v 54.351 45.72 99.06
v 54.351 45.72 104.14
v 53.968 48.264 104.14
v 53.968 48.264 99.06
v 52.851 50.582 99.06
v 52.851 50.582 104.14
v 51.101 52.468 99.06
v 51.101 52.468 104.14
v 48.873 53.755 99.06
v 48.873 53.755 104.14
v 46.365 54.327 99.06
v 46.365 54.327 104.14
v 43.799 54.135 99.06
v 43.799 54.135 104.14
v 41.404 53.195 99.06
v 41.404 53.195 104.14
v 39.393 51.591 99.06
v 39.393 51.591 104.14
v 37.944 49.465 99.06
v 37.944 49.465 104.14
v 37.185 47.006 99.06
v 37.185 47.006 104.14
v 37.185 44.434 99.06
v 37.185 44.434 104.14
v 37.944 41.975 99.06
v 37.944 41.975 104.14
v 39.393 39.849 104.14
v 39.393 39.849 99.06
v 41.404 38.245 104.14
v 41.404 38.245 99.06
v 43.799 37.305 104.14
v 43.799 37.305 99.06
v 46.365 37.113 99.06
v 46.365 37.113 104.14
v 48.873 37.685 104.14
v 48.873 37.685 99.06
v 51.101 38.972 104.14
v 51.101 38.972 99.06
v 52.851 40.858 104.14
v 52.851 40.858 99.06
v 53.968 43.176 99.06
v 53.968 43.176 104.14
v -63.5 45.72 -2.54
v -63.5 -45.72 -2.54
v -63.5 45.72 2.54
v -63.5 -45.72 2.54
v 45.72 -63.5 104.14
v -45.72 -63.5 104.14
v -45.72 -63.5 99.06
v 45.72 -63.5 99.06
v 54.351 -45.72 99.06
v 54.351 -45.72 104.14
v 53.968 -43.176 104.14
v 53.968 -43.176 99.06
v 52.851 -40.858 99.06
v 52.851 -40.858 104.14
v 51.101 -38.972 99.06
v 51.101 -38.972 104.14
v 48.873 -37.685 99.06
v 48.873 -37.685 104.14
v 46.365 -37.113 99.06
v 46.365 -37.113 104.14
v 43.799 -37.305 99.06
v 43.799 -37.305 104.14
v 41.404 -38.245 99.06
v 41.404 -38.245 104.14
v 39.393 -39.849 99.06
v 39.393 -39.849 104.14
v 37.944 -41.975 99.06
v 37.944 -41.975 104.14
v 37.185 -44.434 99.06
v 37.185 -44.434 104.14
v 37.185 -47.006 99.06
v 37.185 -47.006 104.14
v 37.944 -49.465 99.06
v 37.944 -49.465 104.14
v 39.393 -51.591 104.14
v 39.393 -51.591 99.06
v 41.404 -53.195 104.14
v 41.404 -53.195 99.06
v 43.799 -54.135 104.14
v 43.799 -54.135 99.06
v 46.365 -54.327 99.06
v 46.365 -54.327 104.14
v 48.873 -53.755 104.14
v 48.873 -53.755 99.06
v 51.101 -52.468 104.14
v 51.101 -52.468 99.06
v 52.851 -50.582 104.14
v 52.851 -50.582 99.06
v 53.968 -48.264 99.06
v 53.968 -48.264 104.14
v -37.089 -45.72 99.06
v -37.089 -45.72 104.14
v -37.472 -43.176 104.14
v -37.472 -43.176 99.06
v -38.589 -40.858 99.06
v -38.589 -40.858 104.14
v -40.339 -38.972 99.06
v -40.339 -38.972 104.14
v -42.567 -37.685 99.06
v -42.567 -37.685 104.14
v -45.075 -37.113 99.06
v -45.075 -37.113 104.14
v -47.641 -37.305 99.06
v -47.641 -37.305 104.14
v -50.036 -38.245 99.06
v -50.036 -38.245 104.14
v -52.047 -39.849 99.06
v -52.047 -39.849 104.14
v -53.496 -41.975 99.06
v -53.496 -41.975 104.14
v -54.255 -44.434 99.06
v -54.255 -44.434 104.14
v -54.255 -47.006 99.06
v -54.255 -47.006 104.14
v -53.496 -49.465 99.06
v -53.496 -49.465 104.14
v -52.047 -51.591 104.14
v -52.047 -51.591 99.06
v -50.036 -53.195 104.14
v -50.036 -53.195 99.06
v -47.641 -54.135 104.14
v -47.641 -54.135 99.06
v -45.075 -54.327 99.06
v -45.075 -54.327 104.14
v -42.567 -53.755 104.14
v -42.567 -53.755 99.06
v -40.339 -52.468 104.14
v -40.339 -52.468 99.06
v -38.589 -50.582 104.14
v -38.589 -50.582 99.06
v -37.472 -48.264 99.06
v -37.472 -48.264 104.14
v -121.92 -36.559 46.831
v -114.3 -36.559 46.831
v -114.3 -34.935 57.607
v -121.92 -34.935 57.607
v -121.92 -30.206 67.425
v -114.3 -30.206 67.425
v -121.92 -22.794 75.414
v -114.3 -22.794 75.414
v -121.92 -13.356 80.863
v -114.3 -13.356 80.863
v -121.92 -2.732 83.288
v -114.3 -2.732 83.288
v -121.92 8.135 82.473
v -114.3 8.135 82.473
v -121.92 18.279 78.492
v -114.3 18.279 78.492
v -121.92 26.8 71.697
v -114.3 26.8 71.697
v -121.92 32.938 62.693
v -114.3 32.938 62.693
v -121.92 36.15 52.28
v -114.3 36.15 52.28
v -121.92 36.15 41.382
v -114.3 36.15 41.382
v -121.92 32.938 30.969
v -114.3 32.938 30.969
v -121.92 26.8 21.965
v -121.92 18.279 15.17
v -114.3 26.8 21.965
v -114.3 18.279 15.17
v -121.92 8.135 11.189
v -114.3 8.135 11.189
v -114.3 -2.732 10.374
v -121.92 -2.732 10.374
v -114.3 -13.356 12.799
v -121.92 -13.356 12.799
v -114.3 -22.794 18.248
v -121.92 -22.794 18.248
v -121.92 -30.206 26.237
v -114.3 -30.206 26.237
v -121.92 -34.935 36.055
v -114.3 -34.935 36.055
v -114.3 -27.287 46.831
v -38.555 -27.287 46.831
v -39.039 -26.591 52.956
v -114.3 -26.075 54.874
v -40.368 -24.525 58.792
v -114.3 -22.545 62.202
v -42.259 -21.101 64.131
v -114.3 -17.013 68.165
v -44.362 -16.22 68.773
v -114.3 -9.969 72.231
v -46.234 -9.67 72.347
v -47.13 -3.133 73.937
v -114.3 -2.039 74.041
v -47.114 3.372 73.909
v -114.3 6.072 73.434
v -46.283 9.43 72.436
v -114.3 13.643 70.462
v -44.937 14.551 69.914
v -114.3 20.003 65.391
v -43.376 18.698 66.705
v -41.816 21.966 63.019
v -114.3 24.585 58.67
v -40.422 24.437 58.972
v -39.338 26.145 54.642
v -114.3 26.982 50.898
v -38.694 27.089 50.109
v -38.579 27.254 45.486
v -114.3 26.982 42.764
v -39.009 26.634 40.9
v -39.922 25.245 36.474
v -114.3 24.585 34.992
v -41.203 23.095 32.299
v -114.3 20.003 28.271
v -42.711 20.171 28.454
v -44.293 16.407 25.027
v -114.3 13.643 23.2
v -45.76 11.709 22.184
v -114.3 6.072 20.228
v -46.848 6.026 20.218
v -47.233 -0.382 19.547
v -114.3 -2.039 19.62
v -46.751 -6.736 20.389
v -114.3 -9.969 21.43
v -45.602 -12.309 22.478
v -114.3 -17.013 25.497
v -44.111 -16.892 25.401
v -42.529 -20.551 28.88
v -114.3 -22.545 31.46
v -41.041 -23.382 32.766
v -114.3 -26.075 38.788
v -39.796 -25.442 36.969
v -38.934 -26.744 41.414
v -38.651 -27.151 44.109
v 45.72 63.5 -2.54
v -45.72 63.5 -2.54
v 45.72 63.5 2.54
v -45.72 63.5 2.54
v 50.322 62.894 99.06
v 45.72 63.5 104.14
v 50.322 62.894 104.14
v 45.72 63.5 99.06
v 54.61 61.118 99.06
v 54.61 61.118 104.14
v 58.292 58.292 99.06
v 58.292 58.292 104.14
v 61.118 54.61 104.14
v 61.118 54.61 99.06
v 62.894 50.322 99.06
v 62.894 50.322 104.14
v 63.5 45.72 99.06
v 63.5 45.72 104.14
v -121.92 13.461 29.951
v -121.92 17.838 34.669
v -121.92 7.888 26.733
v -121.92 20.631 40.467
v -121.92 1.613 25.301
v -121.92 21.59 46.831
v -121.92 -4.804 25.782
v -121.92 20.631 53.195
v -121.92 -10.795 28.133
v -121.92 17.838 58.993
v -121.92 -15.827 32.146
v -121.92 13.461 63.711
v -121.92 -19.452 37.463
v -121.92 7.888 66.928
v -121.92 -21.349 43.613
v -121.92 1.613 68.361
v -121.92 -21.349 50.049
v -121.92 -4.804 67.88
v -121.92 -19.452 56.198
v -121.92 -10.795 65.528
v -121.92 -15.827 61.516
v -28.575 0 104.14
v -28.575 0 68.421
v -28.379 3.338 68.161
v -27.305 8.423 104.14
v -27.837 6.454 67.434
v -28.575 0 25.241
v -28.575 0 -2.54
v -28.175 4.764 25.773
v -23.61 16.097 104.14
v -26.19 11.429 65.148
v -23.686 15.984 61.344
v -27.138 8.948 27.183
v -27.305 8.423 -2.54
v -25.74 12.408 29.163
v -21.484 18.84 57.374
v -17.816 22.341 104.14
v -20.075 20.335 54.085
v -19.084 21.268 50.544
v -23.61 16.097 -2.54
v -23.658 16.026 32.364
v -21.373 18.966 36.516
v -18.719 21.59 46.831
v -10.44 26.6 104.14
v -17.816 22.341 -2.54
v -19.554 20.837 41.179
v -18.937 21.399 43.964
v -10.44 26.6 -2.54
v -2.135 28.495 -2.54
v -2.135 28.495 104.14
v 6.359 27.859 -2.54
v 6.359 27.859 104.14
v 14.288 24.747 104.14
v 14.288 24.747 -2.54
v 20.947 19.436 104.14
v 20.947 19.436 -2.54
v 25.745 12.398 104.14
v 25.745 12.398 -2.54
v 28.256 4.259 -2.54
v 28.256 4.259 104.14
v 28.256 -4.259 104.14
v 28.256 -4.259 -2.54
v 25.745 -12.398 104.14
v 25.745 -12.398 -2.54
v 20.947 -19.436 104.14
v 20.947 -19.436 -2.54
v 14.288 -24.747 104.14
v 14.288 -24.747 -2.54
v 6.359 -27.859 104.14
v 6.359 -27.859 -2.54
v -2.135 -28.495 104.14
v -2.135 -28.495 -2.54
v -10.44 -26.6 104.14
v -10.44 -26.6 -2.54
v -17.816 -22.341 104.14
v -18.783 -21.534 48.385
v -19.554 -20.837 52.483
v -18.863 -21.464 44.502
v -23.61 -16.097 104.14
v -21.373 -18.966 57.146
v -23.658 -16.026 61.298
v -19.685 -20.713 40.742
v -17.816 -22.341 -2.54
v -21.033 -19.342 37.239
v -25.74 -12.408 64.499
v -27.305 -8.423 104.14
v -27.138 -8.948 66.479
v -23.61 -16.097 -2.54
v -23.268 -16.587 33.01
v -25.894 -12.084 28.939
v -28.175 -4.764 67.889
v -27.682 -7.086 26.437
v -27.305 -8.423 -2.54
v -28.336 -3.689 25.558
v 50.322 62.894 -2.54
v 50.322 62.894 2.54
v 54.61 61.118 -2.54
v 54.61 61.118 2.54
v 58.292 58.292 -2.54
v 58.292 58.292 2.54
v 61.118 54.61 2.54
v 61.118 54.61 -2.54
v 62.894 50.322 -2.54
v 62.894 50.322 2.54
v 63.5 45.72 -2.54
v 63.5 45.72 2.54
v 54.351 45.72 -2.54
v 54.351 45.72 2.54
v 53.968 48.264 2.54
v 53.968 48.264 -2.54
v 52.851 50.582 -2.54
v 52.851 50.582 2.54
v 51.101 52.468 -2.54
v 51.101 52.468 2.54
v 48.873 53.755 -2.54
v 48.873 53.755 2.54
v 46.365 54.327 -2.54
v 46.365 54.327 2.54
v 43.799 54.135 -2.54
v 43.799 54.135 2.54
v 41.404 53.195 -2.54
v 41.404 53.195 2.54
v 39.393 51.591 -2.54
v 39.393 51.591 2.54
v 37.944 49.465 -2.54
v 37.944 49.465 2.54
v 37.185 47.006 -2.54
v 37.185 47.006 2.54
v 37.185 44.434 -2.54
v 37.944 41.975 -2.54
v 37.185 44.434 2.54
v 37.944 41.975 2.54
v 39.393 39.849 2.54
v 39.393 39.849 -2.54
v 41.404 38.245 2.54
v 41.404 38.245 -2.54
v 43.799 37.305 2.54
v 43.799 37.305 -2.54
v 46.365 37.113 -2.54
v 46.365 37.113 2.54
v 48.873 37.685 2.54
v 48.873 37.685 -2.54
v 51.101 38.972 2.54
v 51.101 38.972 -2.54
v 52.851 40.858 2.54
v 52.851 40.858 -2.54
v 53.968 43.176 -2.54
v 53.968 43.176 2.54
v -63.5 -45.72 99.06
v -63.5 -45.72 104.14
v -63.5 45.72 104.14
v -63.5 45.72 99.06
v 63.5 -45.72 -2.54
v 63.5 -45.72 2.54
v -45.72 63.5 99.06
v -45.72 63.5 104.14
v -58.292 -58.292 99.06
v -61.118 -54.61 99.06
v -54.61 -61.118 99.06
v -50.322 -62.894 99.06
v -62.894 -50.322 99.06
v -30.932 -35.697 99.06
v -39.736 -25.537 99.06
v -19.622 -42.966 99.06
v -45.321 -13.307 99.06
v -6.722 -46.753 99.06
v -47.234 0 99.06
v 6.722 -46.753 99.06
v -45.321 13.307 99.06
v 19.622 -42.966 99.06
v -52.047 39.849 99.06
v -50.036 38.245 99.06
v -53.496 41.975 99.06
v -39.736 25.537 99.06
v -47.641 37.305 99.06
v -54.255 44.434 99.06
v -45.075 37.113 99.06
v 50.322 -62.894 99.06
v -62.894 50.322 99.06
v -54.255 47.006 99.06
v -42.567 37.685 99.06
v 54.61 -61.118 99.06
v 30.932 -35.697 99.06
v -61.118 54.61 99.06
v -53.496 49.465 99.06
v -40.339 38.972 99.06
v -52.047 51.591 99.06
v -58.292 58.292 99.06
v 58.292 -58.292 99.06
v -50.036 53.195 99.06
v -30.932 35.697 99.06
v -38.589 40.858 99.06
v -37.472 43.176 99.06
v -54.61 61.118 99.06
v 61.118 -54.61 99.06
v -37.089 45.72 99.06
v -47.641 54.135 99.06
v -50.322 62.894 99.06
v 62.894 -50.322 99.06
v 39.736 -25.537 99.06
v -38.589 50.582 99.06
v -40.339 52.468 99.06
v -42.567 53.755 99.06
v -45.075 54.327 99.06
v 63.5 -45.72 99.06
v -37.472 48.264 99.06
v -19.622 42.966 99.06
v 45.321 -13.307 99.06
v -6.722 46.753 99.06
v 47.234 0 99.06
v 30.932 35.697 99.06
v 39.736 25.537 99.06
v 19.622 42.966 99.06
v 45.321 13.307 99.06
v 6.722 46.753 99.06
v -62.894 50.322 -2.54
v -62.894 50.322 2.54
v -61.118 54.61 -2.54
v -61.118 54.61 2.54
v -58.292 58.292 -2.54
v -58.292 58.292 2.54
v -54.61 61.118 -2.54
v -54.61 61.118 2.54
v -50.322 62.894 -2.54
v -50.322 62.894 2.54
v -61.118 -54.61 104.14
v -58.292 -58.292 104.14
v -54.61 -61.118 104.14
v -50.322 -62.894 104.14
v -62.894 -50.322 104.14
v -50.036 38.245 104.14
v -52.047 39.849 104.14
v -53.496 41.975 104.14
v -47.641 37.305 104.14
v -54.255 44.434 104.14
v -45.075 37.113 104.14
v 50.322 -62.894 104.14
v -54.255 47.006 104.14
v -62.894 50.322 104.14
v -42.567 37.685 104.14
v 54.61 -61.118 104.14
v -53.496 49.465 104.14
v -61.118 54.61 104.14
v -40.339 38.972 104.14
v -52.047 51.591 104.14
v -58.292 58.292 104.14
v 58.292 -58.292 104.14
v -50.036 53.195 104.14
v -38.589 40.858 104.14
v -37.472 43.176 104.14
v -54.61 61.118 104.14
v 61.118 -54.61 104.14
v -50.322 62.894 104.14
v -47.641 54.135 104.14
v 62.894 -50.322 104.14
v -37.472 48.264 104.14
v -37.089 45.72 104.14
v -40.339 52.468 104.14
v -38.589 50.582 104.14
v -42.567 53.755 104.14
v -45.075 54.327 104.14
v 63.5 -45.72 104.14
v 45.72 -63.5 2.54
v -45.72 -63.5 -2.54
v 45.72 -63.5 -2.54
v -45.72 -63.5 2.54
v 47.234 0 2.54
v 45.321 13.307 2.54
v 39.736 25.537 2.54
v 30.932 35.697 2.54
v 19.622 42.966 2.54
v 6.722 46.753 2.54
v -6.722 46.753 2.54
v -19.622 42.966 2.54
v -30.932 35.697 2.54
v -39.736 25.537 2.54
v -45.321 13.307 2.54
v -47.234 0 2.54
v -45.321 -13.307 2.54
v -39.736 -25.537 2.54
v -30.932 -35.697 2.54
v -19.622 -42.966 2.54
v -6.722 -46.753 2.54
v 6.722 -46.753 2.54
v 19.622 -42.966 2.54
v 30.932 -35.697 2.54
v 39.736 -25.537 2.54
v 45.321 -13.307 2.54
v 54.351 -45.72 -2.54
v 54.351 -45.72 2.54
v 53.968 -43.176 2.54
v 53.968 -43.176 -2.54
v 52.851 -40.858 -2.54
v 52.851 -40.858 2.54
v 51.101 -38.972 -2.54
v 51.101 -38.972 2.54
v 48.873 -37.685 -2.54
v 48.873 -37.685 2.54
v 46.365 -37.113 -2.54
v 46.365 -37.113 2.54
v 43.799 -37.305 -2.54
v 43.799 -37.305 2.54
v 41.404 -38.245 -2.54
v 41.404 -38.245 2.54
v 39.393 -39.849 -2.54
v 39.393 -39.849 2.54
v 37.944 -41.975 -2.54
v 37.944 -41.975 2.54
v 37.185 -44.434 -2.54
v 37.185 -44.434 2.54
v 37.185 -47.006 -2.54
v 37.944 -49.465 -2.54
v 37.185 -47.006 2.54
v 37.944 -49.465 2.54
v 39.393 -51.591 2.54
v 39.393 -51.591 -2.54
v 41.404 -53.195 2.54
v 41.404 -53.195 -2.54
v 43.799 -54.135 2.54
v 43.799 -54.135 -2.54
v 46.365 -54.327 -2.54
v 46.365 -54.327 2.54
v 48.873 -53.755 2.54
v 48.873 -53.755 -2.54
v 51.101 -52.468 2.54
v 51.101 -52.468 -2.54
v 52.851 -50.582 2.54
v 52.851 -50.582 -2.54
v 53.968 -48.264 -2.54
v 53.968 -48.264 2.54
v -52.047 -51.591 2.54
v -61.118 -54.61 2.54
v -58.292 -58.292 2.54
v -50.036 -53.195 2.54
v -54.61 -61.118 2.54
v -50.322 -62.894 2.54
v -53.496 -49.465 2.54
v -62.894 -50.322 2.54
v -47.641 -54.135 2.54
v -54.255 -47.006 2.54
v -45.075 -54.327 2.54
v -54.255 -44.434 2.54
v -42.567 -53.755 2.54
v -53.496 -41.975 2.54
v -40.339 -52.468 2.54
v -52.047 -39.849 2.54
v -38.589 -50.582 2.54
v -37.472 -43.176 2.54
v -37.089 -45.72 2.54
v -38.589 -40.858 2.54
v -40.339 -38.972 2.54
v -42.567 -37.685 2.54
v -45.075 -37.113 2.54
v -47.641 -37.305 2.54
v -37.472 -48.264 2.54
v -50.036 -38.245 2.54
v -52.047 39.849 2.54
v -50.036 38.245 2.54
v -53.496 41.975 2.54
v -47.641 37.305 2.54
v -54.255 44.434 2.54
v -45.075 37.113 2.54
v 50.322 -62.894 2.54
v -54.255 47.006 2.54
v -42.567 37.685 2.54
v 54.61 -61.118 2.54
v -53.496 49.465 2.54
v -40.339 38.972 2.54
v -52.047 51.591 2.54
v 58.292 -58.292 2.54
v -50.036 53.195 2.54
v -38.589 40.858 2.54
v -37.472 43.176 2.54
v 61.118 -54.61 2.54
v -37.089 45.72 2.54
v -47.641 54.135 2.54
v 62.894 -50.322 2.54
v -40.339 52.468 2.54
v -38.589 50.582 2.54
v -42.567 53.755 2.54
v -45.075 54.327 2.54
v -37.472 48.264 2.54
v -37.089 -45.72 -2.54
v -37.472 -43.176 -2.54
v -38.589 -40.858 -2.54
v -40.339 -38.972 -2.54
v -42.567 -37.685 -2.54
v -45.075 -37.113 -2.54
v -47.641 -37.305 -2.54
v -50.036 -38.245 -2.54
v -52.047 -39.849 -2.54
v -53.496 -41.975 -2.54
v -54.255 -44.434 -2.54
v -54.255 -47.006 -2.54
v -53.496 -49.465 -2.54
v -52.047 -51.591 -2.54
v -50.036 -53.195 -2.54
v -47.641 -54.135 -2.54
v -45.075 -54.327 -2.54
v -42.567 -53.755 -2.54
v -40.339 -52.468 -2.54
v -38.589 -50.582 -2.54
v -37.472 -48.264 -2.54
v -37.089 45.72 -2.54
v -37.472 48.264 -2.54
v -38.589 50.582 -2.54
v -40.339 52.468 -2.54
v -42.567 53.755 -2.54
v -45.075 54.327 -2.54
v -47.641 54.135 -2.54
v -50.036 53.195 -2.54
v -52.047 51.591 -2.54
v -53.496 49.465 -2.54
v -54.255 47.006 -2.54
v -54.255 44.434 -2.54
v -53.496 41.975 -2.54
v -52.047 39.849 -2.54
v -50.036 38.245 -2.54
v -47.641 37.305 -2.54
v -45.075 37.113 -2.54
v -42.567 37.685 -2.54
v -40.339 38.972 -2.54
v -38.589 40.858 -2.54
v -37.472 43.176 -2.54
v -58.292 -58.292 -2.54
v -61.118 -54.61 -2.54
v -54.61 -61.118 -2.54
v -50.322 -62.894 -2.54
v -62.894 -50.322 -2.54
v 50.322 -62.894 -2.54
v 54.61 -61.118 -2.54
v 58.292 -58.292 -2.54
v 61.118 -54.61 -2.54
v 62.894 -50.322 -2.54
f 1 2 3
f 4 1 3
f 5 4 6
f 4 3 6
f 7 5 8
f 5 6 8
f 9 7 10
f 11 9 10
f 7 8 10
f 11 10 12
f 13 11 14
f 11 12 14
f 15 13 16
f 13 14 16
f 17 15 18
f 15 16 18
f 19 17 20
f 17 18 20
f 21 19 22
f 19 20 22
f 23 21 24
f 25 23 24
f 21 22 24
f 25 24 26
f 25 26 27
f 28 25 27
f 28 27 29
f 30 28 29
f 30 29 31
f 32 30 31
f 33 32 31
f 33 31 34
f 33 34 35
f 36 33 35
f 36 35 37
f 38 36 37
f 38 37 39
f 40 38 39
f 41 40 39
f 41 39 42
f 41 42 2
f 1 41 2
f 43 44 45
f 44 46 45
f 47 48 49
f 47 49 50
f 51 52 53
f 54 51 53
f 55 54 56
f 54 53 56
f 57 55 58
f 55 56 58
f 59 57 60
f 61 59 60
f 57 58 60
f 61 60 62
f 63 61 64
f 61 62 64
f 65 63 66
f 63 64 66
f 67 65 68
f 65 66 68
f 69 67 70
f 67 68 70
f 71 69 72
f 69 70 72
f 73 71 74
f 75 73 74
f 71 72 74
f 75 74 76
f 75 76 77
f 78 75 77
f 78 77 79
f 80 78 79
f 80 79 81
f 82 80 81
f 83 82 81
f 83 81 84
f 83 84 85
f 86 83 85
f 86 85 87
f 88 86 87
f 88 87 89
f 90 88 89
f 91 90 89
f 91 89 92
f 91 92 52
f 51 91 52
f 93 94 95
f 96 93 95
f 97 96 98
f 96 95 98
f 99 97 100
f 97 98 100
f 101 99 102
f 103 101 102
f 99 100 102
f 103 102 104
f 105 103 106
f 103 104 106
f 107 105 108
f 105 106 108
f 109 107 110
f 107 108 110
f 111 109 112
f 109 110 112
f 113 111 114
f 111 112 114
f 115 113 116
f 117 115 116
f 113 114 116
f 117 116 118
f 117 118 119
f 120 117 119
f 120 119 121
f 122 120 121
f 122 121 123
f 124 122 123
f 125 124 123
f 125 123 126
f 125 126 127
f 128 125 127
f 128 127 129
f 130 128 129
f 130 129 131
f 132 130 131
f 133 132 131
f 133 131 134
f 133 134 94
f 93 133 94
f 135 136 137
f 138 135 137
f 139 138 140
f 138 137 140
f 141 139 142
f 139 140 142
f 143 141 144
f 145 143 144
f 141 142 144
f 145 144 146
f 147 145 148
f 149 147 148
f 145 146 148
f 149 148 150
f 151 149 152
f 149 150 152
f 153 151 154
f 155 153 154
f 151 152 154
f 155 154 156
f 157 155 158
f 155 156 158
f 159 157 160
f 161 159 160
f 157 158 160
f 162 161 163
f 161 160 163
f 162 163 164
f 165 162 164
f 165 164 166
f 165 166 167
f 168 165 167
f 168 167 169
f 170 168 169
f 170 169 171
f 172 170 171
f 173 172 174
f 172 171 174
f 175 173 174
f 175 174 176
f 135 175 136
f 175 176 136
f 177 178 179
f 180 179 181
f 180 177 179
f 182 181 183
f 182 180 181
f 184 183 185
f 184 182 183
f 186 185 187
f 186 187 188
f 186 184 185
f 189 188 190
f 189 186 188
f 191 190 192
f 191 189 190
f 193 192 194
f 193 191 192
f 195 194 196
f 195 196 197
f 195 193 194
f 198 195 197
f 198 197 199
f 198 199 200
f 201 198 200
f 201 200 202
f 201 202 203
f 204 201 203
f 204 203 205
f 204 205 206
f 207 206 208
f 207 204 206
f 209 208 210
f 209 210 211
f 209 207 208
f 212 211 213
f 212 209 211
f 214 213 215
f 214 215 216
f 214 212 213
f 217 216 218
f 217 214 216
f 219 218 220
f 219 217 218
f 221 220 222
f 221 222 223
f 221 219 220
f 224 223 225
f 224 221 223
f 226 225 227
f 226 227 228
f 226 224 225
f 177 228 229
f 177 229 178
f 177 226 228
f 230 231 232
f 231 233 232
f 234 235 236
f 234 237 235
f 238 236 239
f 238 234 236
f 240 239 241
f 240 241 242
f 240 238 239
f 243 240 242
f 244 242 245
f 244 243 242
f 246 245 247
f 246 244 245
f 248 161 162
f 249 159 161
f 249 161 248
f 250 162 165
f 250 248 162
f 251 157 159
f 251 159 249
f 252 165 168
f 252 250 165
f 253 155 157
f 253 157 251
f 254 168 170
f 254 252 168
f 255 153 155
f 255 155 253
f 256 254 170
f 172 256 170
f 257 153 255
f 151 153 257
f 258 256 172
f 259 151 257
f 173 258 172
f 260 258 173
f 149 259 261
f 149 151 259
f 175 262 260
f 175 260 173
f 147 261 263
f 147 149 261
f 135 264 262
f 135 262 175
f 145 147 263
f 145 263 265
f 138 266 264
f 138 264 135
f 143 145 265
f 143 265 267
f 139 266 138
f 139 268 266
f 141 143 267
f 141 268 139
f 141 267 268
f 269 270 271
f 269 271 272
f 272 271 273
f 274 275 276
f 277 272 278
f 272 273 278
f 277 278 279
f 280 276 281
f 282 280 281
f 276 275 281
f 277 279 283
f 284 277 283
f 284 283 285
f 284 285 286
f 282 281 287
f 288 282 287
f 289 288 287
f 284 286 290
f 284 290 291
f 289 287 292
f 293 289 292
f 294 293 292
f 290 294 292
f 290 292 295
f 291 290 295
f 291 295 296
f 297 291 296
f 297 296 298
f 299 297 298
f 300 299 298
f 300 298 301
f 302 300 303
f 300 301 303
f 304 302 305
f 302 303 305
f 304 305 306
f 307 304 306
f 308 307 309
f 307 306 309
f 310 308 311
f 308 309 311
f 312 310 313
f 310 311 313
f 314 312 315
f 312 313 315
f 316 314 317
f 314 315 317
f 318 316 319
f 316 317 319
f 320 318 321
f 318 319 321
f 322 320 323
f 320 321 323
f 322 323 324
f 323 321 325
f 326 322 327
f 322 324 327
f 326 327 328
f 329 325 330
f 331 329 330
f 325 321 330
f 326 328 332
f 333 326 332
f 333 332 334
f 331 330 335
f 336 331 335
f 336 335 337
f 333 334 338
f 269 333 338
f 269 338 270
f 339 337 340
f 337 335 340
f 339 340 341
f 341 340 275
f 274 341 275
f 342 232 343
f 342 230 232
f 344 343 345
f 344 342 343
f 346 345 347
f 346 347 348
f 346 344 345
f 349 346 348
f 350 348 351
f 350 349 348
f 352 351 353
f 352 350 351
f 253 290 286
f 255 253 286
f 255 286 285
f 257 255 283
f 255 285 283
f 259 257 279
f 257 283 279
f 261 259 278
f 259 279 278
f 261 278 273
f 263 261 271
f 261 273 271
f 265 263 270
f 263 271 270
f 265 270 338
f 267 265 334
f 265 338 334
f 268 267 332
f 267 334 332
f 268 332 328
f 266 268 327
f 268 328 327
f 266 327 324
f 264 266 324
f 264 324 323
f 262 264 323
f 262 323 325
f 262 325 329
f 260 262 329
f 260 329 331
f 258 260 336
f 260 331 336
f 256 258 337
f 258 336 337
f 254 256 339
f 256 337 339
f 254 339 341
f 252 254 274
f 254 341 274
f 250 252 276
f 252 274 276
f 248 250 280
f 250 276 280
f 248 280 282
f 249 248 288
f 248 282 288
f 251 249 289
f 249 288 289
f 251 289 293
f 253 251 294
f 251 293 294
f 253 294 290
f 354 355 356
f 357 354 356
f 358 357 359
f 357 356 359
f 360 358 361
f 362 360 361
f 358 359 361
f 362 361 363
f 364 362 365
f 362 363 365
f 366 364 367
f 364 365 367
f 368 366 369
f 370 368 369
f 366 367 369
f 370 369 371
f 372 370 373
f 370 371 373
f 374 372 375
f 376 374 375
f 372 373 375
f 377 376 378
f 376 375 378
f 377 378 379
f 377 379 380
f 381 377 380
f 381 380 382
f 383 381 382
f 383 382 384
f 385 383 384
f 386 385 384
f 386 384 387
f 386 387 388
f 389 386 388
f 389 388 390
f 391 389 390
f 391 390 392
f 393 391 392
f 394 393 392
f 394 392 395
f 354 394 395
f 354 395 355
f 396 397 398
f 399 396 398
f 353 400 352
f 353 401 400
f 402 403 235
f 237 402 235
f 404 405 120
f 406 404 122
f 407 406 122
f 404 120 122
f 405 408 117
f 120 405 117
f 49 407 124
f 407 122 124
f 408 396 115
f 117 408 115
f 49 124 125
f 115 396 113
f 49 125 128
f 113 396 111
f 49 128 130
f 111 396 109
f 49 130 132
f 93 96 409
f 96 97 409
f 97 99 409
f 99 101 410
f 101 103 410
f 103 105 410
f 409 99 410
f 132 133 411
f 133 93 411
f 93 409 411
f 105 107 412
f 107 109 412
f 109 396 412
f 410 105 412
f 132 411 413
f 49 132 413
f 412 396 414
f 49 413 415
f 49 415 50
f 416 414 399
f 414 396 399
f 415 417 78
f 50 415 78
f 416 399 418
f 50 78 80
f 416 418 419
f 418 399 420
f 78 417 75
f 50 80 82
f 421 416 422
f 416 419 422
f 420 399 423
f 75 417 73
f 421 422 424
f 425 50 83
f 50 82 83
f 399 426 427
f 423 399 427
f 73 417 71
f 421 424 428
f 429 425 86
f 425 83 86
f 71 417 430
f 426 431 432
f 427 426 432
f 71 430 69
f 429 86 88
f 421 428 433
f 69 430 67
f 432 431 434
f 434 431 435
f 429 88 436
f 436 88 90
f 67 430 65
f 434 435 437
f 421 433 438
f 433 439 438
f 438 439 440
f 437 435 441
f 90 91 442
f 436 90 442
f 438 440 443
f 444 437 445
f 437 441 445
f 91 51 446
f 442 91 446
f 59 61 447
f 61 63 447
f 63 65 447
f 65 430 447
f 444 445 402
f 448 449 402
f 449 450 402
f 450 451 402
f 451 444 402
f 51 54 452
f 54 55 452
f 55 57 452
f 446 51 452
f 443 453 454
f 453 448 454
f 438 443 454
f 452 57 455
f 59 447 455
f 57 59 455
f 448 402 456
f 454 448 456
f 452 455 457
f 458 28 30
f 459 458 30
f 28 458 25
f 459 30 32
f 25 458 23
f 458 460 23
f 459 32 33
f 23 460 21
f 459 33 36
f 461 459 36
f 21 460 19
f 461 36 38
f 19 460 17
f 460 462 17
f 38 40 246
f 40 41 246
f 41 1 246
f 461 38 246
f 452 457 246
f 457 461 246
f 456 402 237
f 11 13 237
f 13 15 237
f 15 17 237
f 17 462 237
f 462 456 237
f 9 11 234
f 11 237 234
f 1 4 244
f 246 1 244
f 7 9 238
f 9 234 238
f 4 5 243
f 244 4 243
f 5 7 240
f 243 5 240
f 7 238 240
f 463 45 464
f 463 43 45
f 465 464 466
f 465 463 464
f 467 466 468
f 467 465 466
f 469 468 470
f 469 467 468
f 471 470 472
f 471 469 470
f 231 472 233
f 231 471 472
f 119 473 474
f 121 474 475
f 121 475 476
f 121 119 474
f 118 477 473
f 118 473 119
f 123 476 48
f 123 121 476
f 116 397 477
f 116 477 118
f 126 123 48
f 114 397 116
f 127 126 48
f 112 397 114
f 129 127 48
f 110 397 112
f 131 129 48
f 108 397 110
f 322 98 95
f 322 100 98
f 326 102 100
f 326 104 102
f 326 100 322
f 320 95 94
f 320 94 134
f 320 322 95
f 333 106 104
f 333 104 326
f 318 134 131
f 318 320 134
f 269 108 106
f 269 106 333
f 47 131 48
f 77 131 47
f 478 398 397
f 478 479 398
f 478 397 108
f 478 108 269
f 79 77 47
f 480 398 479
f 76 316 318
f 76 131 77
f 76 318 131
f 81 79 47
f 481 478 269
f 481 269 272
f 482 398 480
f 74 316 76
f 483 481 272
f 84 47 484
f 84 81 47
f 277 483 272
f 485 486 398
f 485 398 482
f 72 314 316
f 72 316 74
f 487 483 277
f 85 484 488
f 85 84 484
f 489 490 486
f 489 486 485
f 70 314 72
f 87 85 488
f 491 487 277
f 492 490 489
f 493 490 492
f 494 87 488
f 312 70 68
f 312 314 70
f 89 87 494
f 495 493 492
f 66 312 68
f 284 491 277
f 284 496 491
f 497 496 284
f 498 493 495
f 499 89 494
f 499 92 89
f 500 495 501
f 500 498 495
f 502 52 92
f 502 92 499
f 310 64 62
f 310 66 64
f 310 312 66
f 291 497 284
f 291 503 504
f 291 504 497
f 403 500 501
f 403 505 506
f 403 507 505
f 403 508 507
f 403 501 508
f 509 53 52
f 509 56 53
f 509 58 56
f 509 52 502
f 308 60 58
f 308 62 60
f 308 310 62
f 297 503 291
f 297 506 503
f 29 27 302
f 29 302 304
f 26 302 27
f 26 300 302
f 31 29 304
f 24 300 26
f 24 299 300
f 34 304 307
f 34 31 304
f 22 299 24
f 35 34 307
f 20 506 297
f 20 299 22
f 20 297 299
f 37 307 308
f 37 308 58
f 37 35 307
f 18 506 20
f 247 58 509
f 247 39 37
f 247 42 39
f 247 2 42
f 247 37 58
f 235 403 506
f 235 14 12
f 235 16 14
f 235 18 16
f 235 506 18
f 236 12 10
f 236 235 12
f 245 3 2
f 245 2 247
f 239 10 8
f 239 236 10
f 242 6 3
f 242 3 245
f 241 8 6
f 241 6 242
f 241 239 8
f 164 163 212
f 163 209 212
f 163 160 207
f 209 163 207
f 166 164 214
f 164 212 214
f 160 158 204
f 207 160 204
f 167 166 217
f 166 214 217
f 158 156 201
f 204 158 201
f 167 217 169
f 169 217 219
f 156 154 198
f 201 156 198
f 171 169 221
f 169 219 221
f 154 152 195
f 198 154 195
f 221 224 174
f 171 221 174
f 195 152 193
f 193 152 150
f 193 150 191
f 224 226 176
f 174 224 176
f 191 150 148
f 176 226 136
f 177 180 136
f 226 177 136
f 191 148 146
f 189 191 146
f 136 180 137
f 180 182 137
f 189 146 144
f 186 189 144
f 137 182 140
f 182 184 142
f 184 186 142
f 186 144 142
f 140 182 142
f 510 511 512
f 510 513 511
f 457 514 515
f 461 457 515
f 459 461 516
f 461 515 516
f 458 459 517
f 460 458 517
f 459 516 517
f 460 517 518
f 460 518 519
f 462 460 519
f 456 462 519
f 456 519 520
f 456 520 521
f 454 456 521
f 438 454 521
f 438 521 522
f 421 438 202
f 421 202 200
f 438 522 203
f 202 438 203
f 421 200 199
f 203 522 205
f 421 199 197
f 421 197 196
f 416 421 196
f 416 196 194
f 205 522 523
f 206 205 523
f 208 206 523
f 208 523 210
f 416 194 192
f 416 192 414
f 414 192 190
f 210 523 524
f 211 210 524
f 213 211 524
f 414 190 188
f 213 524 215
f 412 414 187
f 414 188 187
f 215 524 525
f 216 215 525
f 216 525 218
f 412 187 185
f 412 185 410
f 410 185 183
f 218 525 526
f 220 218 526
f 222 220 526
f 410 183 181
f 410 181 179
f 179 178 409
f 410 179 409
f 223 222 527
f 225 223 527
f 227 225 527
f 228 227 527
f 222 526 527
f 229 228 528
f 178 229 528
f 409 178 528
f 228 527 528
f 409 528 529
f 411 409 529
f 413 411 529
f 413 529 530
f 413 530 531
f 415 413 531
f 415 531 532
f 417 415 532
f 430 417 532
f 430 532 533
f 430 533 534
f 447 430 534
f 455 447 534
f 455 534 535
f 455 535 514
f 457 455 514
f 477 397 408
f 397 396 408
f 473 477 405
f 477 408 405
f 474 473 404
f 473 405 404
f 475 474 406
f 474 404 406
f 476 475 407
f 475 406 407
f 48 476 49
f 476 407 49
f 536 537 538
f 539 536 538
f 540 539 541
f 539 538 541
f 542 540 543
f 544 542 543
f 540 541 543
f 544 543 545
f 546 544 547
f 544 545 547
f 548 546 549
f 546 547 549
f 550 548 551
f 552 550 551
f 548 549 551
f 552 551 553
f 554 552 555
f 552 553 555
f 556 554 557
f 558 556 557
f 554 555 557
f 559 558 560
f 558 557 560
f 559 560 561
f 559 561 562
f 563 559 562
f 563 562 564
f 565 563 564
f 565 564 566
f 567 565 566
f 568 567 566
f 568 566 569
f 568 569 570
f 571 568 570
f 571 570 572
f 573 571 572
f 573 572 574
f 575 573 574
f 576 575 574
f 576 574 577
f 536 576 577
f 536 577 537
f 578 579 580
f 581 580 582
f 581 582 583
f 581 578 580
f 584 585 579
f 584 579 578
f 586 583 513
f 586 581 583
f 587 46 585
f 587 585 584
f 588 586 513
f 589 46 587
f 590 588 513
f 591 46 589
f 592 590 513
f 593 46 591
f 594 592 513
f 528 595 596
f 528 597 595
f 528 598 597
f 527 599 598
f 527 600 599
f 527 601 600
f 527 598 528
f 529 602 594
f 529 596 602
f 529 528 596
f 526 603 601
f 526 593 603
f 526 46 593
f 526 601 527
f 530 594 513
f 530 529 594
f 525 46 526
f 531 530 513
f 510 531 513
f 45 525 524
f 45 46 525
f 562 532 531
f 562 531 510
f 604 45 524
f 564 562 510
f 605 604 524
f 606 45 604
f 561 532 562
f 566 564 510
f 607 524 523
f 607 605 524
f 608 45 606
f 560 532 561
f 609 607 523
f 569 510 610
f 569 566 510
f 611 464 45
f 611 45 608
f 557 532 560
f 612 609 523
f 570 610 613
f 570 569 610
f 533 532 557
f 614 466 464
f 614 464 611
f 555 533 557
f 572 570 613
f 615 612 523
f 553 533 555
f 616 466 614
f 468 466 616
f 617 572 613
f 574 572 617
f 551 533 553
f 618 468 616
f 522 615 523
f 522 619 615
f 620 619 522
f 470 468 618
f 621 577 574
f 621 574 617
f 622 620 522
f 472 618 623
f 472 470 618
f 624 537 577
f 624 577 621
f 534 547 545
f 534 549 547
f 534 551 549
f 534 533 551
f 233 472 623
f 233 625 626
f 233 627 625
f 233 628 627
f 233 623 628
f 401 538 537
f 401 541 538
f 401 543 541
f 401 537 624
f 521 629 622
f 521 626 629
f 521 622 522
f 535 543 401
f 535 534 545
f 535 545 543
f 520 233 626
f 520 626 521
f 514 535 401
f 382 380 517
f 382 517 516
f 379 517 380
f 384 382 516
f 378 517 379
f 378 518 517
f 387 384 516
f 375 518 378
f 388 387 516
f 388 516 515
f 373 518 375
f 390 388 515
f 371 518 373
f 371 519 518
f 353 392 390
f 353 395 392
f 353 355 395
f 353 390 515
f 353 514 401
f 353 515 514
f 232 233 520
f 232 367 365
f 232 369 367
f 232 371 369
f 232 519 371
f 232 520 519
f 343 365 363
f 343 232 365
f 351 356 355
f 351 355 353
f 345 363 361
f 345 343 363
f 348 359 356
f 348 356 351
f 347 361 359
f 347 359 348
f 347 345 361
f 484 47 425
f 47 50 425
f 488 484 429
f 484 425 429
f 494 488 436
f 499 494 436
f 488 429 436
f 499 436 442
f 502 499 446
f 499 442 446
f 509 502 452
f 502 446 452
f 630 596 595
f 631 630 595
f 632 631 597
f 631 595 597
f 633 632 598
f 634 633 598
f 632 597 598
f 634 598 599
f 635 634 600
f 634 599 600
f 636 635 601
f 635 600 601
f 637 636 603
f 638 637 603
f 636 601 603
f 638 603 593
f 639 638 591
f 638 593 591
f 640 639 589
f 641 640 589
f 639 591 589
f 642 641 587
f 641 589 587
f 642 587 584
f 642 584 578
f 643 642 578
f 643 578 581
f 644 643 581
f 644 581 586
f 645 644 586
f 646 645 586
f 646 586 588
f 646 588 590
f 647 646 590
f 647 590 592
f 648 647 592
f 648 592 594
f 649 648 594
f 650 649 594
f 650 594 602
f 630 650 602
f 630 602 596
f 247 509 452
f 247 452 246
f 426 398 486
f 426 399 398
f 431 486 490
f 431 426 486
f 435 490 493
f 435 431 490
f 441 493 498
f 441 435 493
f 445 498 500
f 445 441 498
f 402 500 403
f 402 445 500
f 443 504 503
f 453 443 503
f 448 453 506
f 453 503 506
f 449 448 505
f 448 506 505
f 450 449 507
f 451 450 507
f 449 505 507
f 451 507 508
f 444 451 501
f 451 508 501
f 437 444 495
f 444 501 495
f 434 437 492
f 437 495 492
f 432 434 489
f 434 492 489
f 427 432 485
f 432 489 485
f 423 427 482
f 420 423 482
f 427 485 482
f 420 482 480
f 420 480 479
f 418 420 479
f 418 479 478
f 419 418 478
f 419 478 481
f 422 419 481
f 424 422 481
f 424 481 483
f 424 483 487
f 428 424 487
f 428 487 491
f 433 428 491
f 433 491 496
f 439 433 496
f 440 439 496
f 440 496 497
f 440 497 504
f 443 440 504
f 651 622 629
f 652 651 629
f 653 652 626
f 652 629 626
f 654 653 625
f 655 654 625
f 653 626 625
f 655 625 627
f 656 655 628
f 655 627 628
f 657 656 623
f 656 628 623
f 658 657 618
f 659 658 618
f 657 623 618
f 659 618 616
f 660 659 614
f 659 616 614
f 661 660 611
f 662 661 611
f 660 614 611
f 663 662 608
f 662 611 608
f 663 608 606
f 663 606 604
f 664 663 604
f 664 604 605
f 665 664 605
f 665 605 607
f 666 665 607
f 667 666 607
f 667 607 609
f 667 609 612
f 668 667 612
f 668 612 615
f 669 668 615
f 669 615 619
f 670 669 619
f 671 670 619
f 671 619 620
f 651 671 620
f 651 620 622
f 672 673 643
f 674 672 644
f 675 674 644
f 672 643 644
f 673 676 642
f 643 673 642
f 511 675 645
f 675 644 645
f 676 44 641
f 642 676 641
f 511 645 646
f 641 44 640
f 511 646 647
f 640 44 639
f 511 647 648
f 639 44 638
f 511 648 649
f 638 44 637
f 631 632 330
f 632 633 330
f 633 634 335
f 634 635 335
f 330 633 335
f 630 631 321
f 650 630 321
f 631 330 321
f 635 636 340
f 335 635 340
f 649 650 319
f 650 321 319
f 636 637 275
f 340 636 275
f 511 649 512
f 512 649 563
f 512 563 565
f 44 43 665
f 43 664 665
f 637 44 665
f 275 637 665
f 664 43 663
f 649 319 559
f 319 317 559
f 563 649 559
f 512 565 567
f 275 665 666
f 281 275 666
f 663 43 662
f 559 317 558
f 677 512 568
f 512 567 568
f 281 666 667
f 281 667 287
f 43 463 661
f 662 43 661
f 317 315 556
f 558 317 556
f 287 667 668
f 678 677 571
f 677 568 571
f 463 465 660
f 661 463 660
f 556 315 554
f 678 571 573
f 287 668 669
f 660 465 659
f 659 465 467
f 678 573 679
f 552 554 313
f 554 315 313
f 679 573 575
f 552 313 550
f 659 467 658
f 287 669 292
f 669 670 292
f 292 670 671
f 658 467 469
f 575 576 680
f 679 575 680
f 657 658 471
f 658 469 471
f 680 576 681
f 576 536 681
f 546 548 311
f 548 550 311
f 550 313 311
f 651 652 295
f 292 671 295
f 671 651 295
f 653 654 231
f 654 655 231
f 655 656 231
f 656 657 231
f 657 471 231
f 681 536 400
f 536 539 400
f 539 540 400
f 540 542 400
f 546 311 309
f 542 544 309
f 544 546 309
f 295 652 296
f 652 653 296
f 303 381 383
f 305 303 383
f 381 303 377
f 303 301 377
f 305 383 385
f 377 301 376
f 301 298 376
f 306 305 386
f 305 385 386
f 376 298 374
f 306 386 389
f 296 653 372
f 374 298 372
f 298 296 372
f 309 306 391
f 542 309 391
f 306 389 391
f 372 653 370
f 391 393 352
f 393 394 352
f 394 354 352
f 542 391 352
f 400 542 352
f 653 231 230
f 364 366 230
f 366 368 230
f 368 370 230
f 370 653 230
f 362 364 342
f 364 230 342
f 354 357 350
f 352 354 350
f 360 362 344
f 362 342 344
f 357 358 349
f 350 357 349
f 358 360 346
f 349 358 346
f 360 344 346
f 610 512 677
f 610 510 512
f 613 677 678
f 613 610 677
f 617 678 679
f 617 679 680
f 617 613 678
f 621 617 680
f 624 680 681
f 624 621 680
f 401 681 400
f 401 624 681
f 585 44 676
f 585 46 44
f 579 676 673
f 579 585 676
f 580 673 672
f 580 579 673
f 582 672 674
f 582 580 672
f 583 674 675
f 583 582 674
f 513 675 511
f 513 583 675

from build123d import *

# Parameters (mm, degrees)
F0_W      = 127
F0_H      = 127
F1_DEPTH  = 2.54
F2_R      = 47.2342022941
F3_DEPTH  = 101.6
F4_W      = 127
F4_H      = 127
F4_R      = 47.2342022941
F5_DEPTH  = 5.08
F6_R      = 27.2868056182
F7_DEPTH  = 50.8
F9_D      = 57.15
F10_R     = 17.78
F11_R     = 8.6311688536
F12_DEPTH = 106.681
F13_R     = 36.5588160366
F14_DEPTH = 7.62
F16_D     = 43.18
F16_DEPTH = 127
F16_TIP   = 12.9725807648


with BuildPart() as f1:
    # F0 (on Top) → F1 (new body, symmetric)
    with BuildSketch(Plane.XY):
        Rectangle(F0_W, F0_H)
    extrude(amount=F1_DEPTH, both=True)

    # F2 (on face) → F3 (join)
    with BuildSketch(Plane.XY.offset(2.54)):
        Circle(F2_R)
    extrude(amount=F3_DEPTH)

    # F4 (on face) → F5 (join)
    with BuildSketch(Plane.XY.offset(104.14)):
        Rectangle(F4_W, F4_H)
        Circle(F4_R, mode=Mode.SUBTRACT)
    extrude(amount=-F5_DEPTH)

    # F6 (on face) → F7 (join, symmetric)
    with BuildSketch(Plane(origin=(-63.5, 0, 0), x_dir=(0, -1, 0), z_dir=(-1, 0, 0))):
        with Locations((0, 46.8309223652)):
            Circle(F6_R)
    extrude(amount=F7_DEPTH, both=True)

    # F9 (through all)
    with Locations(Plane.XY.offset(104.14)):
        with Locations((0, 0)):
            Hole(F9_D / 2)

    # F10
    f10_edges = [f1.edges().sort_by_distance(p)[0] for p in [
        (-63.5, -63.5, 101.6),
        (63.5, -63.5, 101.6),
        (63.5, -63.5, 0),
        (-63.5, -63.5, 0),
        (-63.5, 63.5, 101.6),
        (-63.5, 63.5, 0),
        (63.5, 63.5, 101.6),
        (63.5, 63.5, 0),
    ]]
    fillet(f10_edges, radius=F10_R)

    # F11 (on face) → F12 (cut, through all)
    with BuildSketch(Plane.XY.offset(104.14)):
        with Locations((-45.72, 45.72)):
            Circle(F11_R)
        with Locations((45.72, 45.72)):
            Circle(F11_R)
        with Locations((45.72, -45.72)):
            Circle(F11_R)
        with Locations((-45.72, -45.72)):
            Circle(F11_R)
    extrude(amount=-F12_DEPTH, mode=Mode.SUBTRACT)

    # F13 (on face) → F14 (join)
    with BuildSketch(Plane(origin=(-114.3, 0, 0), x_dir=(0, -1, 0), z_dir=(-1, 0, 0))):
        with Locations((0, 46.8309223652)):
            Circle(F13_R)
    extrude(amount=F14_DEPTH)

    # F16
    with Locations(Plane(origin=(-121.92, 0, 0), x_dir=(0, -1, 0), z_dir=(-1, 0, 0))):
        with Locations((0, 46.8309223652)):
            Hole(F16_D / 2, depth=F16_DEPTH)
            with Locations((0, 0, -(F16_DEPTH + F16_TIP / 2))):  # 118° drill point
                Cone(0, F16_D / 2, F16_TIP, mode=Mode.SUBTRACT)


solid = f1.part
